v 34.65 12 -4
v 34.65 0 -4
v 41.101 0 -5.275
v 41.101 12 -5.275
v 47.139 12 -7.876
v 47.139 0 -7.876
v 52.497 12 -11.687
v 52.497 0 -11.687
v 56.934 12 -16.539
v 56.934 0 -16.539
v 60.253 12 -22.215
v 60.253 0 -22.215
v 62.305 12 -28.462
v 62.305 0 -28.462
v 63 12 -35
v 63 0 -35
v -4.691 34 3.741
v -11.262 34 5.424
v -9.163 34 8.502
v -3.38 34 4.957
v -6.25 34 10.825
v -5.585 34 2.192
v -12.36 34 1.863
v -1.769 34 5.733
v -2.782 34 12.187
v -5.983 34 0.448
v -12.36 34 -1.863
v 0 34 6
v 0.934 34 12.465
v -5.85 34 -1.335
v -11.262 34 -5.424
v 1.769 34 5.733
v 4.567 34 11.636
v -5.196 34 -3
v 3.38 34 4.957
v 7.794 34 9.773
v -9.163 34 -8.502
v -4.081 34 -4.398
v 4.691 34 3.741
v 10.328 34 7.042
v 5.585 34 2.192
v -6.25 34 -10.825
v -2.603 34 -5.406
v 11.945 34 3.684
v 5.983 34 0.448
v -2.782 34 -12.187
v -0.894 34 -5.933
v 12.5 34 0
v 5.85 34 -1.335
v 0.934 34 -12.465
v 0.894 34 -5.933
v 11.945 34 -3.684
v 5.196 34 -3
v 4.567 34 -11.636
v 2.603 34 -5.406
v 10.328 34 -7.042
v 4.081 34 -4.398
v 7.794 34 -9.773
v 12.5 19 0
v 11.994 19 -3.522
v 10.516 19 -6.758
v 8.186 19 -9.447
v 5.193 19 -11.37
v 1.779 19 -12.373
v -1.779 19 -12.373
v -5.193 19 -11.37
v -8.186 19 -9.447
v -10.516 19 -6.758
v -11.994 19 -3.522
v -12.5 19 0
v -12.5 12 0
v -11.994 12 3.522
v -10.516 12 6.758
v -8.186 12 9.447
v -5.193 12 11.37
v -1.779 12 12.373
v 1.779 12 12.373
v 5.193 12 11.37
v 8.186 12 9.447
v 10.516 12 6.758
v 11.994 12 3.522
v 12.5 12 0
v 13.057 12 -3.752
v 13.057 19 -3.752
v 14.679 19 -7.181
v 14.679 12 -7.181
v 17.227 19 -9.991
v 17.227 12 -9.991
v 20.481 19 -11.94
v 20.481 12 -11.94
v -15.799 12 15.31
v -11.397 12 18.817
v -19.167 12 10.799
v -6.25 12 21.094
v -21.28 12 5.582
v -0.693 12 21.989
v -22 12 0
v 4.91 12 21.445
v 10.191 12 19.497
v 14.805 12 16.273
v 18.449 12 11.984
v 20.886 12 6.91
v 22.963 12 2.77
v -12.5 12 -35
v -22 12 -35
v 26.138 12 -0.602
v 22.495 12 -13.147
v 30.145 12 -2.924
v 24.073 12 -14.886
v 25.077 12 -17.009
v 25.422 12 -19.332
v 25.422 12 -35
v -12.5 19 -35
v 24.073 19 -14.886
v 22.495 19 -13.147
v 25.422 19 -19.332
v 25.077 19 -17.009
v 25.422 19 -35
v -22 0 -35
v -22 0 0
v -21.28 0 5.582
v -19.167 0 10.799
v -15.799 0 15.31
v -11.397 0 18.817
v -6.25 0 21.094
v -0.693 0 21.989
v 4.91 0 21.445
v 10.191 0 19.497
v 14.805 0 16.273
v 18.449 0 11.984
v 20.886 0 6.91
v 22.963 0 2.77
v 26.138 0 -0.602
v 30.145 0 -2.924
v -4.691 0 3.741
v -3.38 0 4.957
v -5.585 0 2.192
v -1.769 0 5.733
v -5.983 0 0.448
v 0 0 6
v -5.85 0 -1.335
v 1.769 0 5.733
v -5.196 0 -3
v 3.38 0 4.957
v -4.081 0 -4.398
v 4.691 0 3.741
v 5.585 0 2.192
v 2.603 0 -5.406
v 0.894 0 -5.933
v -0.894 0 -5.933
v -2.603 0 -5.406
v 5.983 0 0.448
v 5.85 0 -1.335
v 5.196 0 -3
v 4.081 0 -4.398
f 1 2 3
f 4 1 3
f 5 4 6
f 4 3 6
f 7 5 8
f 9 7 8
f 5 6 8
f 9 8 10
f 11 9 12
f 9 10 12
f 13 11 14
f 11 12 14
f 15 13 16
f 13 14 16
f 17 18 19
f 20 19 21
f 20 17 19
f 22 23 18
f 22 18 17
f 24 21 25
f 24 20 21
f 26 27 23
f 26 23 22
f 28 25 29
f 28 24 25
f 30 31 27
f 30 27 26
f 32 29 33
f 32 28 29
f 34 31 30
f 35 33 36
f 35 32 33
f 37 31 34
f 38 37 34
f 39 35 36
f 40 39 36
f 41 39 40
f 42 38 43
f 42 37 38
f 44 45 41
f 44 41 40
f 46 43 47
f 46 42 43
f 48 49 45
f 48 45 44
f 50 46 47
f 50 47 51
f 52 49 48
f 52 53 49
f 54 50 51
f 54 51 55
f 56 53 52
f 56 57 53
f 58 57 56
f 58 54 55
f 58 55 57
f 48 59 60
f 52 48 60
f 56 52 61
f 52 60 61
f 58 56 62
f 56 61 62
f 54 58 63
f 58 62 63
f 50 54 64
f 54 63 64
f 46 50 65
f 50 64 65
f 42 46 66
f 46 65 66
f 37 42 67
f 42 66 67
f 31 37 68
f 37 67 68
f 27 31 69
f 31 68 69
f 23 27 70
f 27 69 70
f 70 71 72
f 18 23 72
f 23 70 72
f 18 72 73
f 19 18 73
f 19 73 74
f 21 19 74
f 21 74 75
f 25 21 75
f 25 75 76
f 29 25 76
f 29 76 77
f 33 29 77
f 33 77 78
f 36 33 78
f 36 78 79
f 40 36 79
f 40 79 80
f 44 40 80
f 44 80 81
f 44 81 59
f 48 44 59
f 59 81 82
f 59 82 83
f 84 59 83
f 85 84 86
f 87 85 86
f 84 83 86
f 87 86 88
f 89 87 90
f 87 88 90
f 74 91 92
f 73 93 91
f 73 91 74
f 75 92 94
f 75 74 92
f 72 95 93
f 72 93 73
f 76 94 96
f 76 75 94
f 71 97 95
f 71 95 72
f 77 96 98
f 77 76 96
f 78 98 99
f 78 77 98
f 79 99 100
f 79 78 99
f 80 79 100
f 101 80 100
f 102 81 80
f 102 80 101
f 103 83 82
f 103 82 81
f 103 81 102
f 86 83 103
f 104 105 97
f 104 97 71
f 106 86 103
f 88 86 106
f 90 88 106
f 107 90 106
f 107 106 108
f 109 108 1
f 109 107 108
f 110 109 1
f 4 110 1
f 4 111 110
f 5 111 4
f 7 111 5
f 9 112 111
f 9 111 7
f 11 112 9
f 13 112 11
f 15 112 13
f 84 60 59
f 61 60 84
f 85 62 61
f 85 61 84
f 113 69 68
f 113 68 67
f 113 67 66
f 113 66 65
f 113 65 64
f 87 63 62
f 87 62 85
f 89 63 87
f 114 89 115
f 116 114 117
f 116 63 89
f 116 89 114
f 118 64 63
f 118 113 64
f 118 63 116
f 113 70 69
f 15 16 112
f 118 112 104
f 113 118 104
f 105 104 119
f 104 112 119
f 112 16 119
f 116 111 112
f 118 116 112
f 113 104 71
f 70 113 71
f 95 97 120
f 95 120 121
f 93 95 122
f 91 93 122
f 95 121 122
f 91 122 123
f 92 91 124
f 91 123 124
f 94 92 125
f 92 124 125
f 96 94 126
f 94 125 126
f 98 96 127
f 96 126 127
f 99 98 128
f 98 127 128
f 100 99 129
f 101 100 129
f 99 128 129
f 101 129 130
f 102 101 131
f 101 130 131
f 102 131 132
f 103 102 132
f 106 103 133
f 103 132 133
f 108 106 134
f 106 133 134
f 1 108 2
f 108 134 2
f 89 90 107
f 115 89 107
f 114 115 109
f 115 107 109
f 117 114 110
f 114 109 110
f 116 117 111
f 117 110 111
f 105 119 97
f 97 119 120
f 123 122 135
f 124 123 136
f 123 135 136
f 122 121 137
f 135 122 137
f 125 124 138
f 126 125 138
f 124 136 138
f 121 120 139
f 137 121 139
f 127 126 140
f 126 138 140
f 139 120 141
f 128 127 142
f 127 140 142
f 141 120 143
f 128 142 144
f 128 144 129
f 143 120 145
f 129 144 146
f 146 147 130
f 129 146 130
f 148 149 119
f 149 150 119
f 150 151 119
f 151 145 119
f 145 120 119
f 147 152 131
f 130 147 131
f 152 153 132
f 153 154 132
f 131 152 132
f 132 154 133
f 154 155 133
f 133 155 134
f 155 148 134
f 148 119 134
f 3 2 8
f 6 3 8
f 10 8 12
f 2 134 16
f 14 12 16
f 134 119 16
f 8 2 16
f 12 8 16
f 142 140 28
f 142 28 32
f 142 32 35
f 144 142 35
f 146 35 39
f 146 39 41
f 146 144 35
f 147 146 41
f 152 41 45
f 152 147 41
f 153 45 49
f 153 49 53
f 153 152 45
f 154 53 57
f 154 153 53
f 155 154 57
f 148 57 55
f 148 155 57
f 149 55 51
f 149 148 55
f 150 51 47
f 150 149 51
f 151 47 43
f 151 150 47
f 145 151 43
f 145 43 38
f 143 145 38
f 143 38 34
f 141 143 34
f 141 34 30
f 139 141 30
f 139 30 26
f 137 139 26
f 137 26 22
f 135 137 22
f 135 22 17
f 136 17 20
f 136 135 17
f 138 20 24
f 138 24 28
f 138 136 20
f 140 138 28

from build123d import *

# Parameters (mm, degrees)
BOSS_EXTRUDE1_DEPTH = 12
BOSS_EXTRUDE2_DEPTH = 19
SKETCH1_4_R         = 6
BOSS_EXTRUDE3_DEPTH = 34


with BuildPart() as part:
    # Sketch1 → Boss-Extrude1 (new body)
    with BuildSketch(Plane(origin=(0, 0, 0), x_dir=(1, 0, 0), z_dir=(0, 1, 0))):
        with BuildLine():
            Line((-22, 35), (-22, 0))
            ThreePointArc((-22, 0), (-3.499816256, -21.719836237), (20.886480561, -6.910494177))
            ThreePointArc((20.886480561, -6.910494177), (26.137546313, 0.602202667), (34.650435288, 4))
            ThreePointArc((34.650435288, 4), (54.843960905, 13.995846724), (63, 35))
            Line((63, 35), (25.421858315, 35))
            Line((25.421858315, 35), (25.421858315, 19.331946497))
            ThreePointArc((25.421858315, 19.331946497), (24.072873785, 14.886275206), (20.480860008, 11.939889365))
            ThreePointArc((20.480860008, 11.939889365), (14.678923372, 7.180791818), (12.5, 0))
            ThreePointArc((12.5, 0), (0, -12.5), (-12.5, 0))
            Line((-12.5, 0), (-12.5, 35))
            Line((-12.5, 35), (-22, 35))
        make_face()
    extrude(amount=BOSS_EXTRUDE1_DEPTH)

    # Sketch1<3> → Boss-Extrude2 (add)
    with BuildSketch(Plane(origin=(0, 0, 0), x_dir=(1, 0, 0), z_dir=(0, 1, 0))):
        with BuildLine():
            Line((25.421858315, 35), (-12.5, 35))
            Line((-12.5, 35), (-12.5, 0))
            ThreePointArc((-12.5, 0), (0, 12.5), (12.5, 0))
            ThreePointArc((12.5, 0), (14.678923372, 7.180791818), (20.480860008, 11.939889365))
            ThreePointArc((20.480860008, 11.939889365), (24.072873785, 14.886275206), (25.421858315, 19.331946497))
            Line((25.421858315, 19.331946497), (25.421858315, 35))
        make_face()
    extrude(amount=BOSS_EXTRUDE2_DEPTH)

    # Sketch1<4> → Boss-Extrude3 (add)
    with BuildSketch(Plane(origin=(0, 0, 0), x_dir=(1, 0, 0), z_dir=(0, 1, 0))):
        with BuildLine():
            ThreePointArc((12.5, 0), (0, 12.5), (-12.5, 0))
            ThreePointArc((-12.5, 0), (0, -12.5), (12.5, 0))
        make_face()
        Circle(SKETCH1_4_R, mode=Mode.SUBTRACT)
    extrude(amount=BOSS_EXTRUDE3_DEPTH)


solid = part.part
